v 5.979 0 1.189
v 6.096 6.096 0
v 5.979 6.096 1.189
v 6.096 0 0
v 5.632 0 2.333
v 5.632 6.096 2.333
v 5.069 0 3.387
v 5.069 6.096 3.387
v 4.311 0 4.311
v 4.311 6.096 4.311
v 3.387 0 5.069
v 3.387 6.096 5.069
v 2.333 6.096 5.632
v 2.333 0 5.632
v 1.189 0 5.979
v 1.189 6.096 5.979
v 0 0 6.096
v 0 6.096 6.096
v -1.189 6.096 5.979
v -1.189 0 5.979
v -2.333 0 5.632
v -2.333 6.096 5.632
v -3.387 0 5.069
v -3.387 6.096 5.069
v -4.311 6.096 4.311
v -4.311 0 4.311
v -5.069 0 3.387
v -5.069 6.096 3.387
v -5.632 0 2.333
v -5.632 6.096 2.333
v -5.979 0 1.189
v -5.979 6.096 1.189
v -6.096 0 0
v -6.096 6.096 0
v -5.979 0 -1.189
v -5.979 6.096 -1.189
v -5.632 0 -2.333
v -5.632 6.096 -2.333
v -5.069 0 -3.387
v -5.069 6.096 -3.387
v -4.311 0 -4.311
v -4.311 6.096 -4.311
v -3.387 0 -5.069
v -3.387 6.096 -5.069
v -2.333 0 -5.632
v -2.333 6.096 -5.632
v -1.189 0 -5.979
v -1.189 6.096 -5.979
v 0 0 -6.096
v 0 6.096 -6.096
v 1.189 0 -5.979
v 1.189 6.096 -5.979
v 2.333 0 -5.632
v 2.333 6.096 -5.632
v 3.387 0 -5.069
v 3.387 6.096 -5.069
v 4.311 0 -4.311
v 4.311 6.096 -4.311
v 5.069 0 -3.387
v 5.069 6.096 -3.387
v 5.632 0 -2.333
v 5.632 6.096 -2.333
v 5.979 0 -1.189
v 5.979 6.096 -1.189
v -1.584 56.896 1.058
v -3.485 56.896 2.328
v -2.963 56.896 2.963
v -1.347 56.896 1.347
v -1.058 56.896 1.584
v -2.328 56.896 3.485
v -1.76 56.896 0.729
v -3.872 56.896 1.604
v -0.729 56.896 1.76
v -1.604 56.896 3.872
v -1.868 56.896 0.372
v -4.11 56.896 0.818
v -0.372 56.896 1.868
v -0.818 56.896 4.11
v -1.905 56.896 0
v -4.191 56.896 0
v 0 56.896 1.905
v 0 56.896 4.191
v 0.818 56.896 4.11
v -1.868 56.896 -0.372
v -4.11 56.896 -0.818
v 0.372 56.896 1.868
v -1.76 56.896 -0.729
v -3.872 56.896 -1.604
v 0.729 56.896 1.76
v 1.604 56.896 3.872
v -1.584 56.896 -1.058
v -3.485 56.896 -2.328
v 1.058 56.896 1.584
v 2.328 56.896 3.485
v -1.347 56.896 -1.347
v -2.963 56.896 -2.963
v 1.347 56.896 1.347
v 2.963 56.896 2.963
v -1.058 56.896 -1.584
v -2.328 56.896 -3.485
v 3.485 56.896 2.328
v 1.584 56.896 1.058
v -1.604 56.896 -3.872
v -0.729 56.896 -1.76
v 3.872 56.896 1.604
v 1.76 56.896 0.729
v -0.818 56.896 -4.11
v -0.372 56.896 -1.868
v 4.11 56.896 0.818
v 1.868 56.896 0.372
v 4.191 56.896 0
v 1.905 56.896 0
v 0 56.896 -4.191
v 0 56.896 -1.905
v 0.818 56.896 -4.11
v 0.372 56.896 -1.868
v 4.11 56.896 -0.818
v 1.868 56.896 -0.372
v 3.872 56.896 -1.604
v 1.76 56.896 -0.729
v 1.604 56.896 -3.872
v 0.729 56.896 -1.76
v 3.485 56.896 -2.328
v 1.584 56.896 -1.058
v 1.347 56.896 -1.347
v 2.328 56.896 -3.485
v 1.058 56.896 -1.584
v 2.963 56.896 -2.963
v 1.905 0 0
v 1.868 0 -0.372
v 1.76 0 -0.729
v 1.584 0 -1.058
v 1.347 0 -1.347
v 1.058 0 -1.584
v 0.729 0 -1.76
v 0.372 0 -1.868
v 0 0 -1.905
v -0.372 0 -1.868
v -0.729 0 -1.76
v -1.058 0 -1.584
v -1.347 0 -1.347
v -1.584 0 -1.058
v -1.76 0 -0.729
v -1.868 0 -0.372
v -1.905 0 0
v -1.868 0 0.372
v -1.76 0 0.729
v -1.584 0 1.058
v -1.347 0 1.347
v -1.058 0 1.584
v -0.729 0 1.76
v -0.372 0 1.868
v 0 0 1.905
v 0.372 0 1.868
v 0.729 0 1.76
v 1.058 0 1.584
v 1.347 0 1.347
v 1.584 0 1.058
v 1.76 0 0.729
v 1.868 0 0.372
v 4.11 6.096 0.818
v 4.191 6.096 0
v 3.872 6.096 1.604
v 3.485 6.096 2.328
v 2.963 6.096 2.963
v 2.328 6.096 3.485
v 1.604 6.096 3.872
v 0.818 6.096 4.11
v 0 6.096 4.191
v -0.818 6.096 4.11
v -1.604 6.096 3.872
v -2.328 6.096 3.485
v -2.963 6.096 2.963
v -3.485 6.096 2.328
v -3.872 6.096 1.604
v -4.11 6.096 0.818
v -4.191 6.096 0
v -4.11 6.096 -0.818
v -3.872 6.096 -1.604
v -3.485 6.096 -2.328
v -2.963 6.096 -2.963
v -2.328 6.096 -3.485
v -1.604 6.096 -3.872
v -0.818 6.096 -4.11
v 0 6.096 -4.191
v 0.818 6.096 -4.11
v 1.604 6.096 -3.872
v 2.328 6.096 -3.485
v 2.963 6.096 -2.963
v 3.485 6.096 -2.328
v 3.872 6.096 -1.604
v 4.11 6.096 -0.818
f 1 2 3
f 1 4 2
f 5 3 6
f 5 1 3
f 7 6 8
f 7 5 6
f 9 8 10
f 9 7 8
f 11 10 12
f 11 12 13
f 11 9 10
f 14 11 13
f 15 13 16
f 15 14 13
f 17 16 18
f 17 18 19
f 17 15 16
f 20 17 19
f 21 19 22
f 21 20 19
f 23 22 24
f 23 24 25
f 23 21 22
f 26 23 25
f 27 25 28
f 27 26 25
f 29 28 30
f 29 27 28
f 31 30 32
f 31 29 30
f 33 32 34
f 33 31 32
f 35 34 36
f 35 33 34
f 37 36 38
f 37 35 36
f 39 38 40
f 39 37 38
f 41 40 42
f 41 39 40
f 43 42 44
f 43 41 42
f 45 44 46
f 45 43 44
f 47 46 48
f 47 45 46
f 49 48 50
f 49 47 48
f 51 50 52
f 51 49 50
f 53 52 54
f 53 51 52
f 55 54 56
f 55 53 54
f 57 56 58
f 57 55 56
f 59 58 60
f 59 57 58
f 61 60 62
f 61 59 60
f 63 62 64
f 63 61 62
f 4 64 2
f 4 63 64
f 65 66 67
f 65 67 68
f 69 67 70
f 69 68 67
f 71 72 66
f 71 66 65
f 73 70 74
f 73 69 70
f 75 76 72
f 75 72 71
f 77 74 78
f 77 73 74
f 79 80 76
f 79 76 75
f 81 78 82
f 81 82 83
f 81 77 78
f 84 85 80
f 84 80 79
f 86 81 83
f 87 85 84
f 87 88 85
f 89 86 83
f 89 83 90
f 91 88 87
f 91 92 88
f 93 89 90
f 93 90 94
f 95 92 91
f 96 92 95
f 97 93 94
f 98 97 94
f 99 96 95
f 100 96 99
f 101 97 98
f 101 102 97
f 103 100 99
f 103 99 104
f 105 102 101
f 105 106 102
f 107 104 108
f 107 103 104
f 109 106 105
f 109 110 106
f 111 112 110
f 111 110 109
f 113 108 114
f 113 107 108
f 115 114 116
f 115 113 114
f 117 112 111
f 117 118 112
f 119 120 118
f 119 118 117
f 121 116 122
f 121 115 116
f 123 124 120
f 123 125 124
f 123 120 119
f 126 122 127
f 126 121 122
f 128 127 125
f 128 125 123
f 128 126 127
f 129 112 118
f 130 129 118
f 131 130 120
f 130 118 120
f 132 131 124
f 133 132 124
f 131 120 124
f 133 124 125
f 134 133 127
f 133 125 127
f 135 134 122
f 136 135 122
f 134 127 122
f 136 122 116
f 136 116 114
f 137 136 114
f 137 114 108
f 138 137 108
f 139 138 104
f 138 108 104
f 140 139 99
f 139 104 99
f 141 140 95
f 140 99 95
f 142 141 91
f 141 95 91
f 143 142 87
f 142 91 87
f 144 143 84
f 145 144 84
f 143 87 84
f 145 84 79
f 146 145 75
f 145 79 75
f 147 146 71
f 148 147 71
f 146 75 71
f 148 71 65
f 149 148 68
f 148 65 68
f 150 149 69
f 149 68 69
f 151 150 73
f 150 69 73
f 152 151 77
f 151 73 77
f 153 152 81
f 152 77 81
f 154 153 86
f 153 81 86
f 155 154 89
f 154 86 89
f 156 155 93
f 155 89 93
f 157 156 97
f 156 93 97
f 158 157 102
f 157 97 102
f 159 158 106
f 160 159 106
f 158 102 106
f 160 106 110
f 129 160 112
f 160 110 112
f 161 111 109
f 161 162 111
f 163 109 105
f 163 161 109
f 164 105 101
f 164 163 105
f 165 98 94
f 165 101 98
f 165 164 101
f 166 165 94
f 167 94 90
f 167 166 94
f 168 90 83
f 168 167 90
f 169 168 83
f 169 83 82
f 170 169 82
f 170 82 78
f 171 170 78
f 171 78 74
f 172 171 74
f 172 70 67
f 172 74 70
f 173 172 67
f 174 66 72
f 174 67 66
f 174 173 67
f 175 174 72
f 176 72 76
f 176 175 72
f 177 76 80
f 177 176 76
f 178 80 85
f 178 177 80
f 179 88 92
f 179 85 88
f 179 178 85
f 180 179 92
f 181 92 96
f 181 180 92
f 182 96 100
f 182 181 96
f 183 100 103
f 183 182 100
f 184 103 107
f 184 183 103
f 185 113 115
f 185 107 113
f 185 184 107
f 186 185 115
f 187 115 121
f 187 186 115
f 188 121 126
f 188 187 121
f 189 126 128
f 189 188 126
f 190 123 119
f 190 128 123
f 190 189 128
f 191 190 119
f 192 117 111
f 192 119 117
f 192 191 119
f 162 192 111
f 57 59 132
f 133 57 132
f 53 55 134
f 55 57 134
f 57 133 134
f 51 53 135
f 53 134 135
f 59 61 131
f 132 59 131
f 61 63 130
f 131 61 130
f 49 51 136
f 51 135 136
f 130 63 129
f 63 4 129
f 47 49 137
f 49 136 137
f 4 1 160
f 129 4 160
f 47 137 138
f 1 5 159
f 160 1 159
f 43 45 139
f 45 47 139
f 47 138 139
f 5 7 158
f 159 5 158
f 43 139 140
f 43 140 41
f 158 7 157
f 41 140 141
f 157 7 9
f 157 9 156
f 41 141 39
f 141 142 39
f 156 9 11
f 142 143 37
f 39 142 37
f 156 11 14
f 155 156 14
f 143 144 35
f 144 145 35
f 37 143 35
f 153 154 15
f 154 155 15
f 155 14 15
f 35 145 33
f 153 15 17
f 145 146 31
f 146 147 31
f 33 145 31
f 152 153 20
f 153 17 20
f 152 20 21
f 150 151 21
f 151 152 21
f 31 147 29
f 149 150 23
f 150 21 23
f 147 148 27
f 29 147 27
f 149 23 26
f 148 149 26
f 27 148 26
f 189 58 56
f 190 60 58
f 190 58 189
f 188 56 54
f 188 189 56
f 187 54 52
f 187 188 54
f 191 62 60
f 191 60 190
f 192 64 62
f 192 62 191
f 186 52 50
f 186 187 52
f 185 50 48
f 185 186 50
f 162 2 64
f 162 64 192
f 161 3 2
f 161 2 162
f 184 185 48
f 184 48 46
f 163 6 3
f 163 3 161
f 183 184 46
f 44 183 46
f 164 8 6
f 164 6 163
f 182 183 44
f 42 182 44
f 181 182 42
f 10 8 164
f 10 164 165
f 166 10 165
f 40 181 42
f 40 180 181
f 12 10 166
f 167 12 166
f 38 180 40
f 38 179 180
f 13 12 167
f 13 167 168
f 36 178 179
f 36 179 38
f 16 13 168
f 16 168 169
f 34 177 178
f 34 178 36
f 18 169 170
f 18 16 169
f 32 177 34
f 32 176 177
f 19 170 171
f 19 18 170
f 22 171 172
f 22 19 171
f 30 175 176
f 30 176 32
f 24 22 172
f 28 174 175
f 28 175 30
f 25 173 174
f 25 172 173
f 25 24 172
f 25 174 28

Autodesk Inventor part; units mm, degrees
ref_plane "YZ Plane" through (0, 0, 0) normal (1, 0, 0) x (0, 1, 0)
ref_plane "XZ Plane" through (0, 0, 0) normal (0, 1, 0) x (-1, 0, 0)
ref_plane "XY Plane" through (0, 0, 0) normal (0, 0, 1) x (1, 0, 0)
sketch "Sketch1" plane through (0, 0, 0) normal (0, 1, 0) x (-1, 0, 0)
  circle A0 centre (0, 0) radius 7.366
  dimension "d0" = 14.732
extrude "Extrusion1" add sketch "Sketch1" along normal blind 6.096
sketch "Sketch2" plane through (0, 6.096, 0) normal (0, 1, 0) x (1, 0, 0)
  circle A0 centre (0, 0) radius 4.191
  dimension "d3" = 8.382
extrude "Extrusion2" add sketch "Sketch2" along normal blind 50.8
sketch "Sketch3" plane through (0, 0, 0) normal (0, -1, 0) x (1, 0, 0)
  circle A0 centre (0, 0) radius 7.366
  circle A1 centre (0, 0) radius 4.191 projected
  circle A2 centre (0, 0) radius 6.096
  circle A3 centre (0, 0) radius 7.366
  dimension "d6" = 12.192
extrude "Extrusion3" cut sketch "Sketch3" against normal through all contours A0
sketch "Sketch4" plane through (0, 56.896, 0) normal (0, 1, 0) x (1, 0, 0)
  circle A0 centre (0, 0) radius 4.191 projected
  circle A1 centre (0, 0) radius 1.905
  dimension "d9" = 3.81
extrude "Extrusion4" cut sketch "Sketch4" against normal through all contours A1
properties part number "arm connector"
